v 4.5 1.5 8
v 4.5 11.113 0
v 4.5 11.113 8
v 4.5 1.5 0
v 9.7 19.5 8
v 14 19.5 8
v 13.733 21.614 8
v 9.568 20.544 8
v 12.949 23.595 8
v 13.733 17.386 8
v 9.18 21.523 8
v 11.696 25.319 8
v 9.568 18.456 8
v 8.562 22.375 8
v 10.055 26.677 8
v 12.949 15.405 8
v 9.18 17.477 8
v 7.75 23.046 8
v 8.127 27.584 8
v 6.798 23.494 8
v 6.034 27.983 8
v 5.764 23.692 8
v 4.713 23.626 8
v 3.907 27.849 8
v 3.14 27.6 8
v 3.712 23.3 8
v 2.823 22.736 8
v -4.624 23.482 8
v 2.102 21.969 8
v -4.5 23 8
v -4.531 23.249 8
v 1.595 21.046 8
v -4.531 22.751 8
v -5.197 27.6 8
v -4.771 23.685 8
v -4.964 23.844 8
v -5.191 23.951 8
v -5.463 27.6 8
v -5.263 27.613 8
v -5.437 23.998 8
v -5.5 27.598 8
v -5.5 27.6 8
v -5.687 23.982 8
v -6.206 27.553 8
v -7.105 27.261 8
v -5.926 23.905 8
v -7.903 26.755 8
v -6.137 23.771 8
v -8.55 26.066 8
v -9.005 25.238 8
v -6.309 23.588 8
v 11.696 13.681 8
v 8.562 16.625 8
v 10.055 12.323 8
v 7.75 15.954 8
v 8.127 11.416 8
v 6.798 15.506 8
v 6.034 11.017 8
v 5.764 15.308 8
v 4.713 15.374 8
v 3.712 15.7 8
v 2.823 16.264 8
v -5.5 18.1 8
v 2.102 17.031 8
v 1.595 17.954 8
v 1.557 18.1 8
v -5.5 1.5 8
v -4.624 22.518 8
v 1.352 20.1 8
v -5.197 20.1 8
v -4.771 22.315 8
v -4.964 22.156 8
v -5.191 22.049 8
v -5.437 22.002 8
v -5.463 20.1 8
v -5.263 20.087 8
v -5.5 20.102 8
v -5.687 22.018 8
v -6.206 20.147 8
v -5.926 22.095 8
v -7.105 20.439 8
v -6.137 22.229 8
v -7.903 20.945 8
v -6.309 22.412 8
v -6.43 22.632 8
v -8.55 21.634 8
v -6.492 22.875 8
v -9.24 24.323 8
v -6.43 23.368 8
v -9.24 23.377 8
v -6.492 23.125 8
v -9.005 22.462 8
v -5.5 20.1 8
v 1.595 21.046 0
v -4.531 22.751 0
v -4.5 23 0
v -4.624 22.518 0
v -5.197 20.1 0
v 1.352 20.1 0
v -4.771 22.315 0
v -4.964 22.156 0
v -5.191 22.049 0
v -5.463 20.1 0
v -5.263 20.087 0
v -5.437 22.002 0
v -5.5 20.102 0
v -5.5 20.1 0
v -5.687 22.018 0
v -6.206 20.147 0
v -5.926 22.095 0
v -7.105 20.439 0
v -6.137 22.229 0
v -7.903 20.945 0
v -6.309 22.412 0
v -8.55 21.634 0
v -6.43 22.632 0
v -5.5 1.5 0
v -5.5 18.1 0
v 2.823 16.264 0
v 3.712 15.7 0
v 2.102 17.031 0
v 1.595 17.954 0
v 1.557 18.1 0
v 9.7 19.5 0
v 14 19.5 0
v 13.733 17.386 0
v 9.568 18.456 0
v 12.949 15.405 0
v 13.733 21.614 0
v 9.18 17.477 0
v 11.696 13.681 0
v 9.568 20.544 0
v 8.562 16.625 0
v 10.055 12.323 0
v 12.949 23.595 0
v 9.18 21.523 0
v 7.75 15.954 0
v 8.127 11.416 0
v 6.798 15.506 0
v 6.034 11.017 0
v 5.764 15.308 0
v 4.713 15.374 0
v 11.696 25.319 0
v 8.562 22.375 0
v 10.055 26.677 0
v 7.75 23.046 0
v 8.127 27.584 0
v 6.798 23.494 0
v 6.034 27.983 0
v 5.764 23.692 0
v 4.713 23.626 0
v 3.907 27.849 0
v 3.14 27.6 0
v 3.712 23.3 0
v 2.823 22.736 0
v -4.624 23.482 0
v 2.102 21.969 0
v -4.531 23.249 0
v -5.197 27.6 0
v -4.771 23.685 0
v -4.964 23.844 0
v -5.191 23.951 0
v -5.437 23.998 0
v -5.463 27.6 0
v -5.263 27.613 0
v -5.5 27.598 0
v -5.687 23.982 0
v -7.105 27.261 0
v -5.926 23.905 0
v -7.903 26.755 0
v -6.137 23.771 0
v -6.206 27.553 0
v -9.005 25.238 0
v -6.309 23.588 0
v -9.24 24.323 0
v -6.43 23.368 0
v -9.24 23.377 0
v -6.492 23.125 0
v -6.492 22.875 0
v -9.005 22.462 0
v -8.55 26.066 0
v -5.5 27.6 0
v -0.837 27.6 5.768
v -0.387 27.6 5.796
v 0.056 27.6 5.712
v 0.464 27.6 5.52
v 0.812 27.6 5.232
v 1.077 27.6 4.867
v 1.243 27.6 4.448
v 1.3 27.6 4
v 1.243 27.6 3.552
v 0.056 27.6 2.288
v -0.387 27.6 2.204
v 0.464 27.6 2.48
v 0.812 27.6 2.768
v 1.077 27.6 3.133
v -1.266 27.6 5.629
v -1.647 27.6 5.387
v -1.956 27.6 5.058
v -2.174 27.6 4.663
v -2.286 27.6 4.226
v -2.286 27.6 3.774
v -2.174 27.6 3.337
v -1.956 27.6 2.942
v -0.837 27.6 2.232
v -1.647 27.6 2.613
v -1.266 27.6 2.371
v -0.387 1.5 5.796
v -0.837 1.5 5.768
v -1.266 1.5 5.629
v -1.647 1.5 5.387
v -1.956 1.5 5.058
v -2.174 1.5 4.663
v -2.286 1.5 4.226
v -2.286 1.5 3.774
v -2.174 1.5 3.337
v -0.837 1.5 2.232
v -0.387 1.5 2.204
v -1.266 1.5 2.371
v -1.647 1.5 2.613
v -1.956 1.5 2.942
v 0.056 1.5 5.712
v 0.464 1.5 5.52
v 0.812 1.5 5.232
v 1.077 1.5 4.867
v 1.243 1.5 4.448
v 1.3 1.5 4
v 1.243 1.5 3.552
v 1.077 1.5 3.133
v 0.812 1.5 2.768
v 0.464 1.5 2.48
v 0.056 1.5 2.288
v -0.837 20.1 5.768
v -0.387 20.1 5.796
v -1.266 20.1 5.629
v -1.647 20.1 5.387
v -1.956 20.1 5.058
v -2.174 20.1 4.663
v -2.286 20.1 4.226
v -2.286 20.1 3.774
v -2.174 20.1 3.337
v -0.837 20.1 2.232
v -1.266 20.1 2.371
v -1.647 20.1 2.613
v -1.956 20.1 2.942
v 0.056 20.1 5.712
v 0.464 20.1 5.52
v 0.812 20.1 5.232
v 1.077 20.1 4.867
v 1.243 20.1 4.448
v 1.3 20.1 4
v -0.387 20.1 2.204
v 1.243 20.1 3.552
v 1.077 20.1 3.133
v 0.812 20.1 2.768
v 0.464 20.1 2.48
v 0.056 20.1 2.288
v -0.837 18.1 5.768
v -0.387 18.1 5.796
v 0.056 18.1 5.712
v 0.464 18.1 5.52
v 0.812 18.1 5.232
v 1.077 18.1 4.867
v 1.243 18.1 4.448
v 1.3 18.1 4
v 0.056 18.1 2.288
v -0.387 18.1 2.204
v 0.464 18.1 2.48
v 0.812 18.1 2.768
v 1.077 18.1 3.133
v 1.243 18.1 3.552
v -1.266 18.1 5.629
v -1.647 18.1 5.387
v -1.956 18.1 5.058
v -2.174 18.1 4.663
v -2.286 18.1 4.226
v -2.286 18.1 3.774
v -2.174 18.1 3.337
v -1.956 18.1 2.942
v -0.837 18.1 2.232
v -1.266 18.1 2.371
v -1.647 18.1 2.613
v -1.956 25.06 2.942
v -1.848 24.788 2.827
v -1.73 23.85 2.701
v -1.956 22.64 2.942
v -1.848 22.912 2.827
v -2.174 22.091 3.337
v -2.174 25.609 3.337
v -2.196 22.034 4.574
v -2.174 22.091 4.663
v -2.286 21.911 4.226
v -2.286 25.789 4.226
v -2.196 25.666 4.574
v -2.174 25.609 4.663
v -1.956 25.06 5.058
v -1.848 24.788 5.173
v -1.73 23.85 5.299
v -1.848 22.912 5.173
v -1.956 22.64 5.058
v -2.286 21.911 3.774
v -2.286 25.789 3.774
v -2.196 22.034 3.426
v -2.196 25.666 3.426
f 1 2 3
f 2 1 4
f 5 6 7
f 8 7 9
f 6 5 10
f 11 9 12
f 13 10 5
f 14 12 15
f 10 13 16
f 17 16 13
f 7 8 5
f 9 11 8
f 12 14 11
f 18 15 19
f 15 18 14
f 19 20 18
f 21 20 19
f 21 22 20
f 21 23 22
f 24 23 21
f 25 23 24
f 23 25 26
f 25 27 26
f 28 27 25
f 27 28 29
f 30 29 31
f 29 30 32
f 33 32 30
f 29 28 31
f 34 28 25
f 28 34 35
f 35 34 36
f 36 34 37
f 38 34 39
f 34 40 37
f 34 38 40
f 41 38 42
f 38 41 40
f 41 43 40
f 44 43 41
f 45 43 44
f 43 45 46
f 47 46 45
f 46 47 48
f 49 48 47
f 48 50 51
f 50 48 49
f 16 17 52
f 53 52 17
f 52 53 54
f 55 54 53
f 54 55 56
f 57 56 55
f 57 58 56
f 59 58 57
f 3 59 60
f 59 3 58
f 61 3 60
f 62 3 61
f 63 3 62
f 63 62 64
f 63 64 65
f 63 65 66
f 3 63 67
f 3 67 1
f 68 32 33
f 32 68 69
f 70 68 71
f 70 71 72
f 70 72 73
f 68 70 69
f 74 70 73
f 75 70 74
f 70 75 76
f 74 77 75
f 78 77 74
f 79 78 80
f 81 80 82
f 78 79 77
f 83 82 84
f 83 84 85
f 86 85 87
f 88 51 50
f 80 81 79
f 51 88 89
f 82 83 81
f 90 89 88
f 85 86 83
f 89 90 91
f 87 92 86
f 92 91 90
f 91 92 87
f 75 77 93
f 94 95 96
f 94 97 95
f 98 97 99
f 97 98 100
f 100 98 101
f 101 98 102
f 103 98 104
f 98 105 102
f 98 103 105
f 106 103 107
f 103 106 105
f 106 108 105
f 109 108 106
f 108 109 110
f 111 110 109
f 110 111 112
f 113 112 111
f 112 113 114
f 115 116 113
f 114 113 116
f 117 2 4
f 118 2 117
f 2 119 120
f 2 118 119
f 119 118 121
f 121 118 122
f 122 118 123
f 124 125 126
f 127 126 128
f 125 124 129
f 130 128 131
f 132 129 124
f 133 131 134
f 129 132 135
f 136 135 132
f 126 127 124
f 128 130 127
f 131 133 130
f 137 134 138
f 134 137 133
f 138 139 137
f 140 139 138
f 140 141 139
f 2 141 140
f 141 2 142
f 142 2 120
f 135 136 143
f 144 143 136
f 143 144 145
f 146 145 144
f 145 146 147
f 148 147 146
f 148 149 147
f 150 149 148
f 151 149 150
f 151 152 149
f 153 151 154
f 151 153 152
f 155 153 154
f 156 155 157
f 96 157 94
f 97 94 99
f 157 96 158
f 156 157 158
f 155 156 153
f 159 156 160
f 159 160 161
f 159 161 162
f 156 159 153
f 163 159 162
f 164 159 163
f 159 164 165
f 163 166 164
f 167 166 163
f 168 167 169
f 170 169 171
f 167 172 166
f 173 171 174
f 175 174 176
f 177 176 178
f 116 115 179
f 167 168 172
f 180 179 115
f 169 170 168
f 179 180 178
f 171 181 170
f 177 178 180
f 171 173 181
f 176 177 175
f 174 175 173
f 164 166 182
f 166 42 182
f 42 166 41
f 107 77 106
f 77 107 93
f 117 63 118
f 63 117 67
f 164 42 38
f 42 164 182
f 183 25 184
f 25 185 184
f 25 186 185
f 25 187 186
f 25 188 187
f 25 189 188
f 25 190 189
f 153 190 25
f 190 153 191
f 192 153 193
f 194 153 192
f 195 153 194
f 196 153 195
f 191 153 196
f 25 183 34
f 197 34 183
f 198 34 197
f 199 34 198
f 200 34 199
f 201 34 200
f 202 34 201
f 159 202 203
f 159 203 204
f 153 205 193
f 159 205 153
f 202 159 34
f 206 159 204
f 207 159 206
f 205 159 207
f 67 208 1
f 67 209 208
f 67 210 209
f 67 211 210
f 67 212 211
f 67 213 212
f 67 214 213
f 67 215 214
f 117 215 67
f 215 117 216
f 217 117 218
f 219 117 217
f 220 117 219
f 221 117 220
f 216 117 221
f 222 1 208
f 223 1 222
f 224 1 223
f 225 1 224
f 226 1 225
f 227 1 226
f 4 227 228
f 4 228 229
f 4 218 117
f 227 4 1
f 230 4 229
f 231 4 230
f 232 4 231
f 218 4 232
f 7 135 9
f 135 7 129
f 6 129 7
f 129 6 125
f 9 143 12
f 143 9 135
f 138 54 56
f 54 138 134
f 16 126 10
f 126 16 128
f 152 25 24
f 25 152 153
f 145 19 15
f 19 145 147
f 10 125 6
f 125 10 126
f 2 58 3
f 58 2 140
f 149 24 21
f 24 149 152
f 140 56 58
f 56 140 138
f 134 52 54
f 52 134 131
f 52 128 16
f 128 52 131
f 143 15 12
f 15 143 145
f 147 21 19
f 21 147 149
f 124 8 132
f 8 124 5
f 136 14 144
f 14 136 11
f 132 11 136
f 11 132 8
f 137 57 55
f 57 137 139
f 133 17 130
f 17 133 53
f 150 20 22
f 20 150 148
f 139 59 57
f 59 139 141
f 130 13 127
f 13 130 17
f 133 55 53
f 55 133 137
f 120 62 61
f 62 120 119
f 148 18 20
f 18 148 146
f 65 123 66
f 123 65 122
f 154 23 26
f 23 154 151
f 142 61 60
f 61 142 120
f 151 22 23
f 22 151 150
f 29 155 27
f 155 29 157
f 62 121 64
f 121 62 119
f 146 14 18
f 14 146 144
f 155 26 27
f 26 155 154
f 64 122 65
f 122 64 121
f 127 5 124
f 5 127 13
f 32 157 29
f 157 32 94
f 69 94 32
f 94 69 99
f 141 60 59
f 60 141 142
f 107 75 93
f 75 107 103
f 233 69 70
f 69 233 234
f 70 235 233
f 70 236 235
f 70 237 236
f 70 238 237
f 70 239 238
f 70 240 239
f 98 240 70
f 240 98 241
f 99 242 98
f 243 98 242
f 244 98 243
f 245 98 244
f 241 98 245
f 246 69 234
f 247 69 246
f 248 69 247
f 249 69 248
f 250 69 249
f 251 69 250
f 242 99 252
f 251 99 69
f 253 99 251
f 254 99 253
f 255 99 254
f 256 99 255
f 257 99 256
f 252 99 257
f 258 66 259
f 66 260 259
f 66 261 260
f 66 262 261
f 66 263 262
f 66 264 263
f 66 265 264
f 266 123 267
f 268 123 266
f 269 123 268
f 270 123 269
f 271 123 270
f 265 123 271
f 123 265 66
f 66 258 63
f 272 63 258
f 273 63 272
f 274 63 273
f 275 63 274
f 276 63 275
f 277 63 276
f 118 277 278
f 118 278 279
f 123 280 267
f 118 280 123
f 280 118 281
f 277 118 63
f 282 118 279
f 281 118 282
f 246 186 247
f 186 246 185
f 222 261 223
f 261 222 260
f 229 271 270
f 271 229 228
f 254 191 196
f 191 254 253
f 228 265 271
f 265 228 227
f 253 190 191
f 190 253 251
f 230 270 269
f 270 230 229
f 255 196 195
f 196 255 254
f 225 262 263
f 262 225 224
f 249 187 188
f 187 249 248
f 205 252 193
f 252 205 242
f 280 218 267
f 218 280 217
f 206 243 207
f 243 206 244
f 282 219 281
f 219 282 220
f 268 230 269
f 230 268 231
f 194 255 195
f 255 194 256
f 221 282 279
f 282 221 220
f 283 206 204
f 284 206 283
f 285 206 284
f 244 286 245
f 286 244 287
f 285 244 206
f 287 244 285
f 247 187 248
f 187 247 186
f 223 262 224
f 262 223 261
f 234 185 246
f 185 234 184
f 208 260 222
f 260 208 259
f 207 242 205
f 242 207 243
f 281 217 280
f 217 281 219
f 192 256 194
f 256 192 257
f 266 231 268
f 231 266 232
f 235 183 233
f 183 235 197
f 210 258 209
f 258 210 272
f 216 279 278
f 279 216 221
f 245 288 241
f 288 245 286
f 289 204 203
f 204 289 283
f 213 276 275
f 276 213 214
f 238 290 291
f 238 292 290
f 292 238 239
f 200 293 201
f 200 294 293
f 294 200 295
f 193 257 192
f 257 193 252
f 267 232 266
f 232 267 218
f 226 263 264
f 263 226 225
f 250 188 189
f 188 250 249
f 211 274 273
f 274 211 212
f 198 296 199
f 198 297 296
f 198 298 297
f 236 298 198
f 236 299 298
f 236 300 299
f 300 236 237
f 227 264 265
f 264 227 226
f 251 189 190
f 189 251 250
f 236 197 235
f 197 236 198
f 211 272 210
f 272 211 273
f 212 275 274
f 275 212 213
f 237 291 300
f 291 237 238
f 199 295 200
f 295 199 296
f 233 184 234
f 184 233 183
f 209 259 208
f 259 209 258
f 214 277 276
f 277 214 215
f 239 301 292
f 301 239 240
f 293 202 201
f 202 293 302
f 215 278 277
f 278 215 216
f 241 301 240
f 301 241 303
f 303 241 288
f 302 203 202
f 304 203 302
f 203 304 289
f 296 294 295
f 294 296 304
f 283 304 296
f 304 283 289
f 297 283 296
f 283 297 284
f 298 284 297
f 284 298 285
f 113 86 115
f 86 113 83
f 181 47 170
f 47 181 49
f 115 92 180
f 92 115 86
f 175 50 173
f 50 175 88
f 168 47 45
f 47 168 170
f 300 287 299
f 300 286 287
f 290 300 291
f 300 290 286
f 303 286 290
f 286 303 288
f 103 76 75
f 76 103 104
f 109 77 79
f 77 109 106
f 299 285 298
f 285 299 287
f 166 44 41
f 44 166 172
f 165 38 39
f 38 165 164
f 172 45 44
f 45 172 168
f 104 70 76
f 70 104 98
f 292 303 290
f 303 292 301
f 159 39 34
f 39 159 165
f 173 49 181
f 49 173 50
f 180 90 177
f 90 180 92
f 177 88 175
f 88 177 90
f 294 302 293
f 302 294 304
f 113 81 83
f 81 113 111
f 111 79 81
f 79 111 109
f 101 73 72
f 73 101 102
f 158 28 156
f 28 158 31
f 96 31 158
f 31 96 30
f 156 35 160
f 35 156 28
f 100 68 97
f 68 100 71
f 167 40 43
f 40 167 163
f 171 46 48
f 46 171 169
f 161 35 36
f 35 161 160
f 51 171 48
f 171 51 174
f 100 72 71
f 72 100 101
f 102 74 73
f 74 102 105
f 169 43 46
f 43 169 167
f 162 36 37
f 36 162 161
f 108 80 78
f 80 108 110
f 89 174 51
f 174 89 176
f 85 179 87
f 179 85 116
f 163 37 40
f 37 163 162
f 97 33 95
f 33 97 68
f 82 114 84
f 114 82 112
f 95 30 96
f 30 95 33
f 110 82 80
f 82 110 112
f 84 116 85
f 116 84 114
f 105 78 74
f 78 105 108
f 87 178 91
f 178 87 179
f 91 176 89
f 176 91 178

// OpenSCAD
//import("/home/mark/Dropbox/printrbot/things/printrbot/pb-BeltClip-x2.stl");
//#import("/home/mark/Dropbox/printrbot/things/printrbot/pb-Y-BarEnd-x4.stl");

stem_extension = 3.6;
len =22.5 + stem_extension;
wid =10;
ht   =8;
cq  = 25;
slot_len = 2;

cyl_wid=8.5;
hole_wid=1.8;

xoff=-0.5*wid - 0.5;
yoff=1.5;

xco = 11;
yco = 14.4 + stem_extension;
module p() {
 difference() {
  union() {
   cube(size=[wid, len, ht]);
   translate([xco, yco, 0]) difference()
    cylinder(r=cyl_wid, h=ht, $fn=cq);
  }
  translate([xco,yco,-1]) cylinder(r=cyl_wid - 4.3, h=ht+2, $fn=cq);
 }
}


difference() {
union() {
translate([xoff,yoff,0]) {
 difference() {
  p();
  translate([-1,13+stem_extension,-1])
   cube(size=[wid+2, slot_len, ht+2]);
  rotate([-90,0,0]) translate([wid/2, ht/-2,-5]) #cylinder(r=hole_wid, h=len+10, $fn=cq);
 }
}

translate([-5.5, 23.85, 0]) cylinder(r=cyl_wid-4.73, h=ht, $fn=cq);
}

translate([-5.5,23,-1]) cylinder(r=1, h=ht+2, $fn=cq);
}
